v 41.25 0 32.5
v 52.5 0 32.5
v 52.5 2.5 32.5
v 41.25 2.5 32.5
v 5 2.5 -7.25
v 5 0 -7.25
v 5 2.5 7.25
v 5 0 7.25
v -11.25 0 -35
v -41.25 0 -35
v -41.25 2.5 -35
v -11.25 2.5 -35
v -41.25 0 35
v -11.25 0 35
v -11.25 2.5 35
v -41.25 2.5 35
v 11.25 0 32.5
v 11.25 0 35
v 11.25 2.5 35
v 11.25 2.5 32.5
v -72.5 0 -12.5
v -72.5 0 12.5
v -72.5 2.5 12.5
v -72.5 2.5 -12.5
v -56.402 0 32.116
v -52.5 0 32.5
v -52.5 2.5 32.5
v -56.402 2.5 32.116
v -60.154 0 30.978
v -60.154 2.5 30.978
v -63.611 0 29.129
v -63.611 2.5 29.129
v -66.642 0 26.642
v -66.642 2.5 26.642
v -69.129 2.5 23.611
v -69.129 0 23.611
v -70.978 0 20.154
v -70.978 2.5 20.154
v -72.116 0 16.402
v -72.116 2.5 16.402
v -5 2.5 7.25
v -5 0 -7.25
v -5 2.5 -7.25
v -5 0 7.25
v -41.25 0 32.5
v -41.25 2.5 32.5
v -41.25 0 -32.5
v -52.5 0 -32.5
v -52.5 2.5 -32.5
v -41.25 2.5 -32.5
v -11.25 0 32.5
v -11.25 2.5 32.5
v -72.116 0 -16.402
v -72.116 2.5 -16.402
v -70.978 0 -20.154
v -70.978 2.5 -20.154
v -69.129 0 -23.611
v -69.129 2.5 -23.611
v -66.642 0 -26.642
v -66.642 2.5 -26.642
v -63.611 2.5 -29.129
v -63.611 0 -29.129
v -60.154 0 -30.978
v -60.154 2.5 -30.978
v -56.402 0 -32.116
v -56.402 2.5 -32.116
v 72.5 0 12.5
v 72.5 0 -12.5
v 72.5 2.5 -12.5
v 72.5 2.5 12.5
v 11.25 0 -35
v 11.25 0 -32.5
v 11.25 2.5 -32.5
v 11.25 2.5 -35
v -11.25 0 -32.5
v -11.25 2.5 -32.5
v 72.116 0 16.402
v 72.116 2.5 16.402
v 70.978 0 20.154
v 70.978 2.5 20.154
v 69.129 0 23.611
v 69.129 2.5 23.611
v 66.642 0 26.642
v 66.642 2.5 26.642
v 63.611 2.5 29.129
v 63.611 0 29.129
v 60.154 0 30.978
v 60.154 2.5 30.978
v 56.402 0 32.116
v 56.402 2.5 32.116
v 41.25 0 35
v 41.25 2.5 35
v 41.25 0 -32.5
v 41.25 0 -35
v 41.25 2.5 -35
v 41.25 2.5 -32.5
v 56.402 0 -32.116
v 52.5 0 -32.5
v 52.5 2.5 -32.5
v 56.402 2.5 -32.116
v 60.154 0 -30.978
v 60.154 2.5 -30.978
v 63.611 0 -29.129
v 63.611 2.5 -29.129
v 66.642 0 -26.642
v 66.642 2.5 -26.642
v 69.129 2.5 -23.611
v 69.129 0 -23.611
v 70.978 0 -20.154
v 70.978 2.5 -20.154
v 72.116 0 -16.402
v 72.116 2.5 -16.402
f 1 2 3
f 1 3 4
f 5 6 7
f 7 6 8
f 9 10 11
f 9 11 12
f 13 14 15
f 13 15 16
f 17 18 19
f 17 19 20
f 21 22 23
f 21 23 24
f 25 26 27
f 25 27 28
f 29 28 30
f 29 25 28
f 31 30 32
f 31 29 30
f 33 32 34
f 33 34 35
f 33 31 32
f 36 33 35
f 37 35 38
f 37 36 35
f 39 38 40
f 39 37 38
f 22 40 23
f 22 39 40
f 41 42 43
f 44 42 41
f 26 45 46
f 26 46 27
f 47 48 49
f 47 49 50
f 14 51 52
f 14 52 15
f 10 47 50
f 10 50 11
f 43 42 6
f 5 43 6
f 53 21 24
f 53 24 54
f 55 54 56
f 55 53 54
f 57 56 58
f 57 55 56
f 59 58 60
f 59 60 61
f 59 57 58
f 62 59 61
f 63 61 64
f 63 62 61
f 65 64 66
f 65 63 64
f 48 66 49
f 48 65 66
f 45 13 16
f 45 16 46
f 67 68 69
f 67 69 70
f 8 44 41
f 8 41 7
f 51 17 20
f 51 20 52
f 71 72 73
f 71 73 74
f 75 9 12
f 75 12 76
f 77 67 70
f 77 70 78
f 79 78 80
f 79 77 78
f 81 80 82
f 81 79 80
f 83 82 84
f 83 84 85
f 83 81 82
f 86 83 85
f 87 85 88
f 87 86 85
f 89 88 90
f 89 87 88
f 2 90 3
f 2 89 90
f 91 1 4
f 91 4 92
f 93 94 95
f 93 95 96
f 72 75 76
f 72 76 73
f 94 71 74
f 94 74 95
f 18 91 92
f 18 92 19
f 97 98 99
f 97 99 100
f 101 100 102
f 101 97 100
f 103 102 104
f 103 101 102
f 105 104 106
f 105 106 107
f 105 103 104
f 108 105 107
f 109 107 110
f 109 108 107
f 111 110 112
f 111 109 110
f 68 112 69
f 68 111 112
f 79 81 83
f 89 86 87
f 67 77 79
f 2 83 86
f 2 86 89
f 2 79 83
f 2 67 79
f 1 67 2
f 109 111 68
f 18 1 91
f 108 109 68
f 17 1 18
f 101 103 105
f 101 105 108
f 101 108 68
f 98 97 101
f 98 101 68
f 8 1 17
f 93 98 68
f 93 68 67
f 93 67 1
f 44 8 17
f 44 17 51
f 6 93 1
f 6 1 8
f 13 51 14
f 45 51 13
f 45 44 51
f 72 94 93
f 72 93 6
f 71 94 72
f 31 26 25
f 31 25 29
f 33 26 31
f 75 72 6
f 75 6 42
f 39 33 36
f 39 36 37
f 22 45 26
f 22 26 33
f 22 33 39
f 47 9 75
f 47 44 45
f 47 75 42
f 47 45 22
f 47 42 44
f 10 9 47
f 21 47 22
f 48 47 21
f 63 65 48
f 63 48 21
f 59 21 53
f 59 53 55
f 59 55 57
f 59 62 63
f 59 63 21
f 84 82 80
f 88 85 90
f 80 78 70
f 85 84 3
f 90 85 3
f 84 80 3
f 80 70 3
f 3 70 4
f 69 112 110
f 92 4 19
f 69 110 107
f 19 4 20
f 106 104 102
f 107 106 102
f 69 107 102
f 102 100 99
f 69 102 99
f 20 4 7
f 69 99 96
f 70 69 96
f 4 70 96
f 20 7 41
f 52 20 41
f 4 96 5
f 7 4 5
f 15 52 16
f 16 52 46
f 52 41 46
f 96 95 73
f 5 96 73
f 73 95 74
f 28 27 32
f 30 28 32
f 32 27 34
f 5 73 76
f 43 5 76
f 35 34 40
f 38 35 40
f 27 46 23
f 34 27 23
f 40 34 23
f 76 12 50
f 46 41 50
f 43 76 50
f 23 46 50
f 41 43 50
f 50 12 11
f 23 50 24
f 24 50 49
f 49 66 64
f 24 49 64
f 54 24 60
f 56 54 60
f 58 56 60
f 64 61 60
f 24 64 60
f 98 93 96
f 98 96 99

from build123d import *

# Parameters (mm, degrees)
BOSS_EXTRUDE2_DEPTH = 2.5
SKETCH3_W           = 10
SKETCH3_H           = 14.5
CUT_EXTRUDE3_DEPTH  = 40


with BuildPart() as part:
    # Sketch1 → Boss-Extrude2 (new body)
    with BuildSketch(Plane(origin=(0, 0, 0), x_dir=(1, 0, 0), z_dir=(0, 1, 0))):
        with BuildLine():
            Line((-52.5, 32.5), (-41.25, 32.5))
            Line((-41.25, 32.5), (-41.25, 35))
            Line((-41.25, 35), (-11.25, 35))
            Line((-11.25, 35), (-11.25, 32.5))
            Line((-11.25, 32.5), (11.25, 32.5))
            Line((11.25, 32.5), (11.25, 35))
            Line((11.25, 35), (41.25, 35))
            Line((41.25, 35), (41.25, 32.5))
            Line((41.25, 32.5), (52.5, 32.5))
            ThreePointArc((52.5, 32.5), (66.642135624, 26.642135624), (72.5, 12.5))
            Line((72.5, 12.5), (72.5, -12.5))
            ThreePointArc((72.5, -12.5), (66.642135624, -26.642135624), (52.5, -32.5))
            Line((52.5, -32.5), (41.25, -32.5))
            Line((41.25, -32.5), (41.25, -35))
            Line((41.25, -35), (11.25, -35))
            Line((11.25, -35), (11.25, -32.5))
            Line((11.25, -32.5), (-11.25, -32.5))
            Line((-11.25, -32.5), (-11.25, -35))
            Line((-11.25, -35), (-41.25, -35))
            Line((-41.25, -35), (-41.25, -32.5))
            Line((-41.25, -32.5), (-52.5, -32.5))
            ThreePointArc((-52.5, -32.5), (-66.642135624, -26.642135624), (-72.5, -12.5))
            Line((-72.5, -12.5), (-72.5, 12.5))
            ThreePointArc((-72.5, 12.5), (-66.642135624, 26.642135624), (-52.5, 32.5))
        make_face()
    extrude(amount=BOSS_EXTRUDE2_DEPTH)

    # Sketch3 → Cut-Extrude3 (cut)
    with BuildSketch(Plane.XZ):
        Rectangle(SKETCH3_W, SKETCH3_H)
    extrude(amount=-CUT_EXTRUDE3_DEPTH, mode=Mode.SUBTRACT)


solid = part.part
